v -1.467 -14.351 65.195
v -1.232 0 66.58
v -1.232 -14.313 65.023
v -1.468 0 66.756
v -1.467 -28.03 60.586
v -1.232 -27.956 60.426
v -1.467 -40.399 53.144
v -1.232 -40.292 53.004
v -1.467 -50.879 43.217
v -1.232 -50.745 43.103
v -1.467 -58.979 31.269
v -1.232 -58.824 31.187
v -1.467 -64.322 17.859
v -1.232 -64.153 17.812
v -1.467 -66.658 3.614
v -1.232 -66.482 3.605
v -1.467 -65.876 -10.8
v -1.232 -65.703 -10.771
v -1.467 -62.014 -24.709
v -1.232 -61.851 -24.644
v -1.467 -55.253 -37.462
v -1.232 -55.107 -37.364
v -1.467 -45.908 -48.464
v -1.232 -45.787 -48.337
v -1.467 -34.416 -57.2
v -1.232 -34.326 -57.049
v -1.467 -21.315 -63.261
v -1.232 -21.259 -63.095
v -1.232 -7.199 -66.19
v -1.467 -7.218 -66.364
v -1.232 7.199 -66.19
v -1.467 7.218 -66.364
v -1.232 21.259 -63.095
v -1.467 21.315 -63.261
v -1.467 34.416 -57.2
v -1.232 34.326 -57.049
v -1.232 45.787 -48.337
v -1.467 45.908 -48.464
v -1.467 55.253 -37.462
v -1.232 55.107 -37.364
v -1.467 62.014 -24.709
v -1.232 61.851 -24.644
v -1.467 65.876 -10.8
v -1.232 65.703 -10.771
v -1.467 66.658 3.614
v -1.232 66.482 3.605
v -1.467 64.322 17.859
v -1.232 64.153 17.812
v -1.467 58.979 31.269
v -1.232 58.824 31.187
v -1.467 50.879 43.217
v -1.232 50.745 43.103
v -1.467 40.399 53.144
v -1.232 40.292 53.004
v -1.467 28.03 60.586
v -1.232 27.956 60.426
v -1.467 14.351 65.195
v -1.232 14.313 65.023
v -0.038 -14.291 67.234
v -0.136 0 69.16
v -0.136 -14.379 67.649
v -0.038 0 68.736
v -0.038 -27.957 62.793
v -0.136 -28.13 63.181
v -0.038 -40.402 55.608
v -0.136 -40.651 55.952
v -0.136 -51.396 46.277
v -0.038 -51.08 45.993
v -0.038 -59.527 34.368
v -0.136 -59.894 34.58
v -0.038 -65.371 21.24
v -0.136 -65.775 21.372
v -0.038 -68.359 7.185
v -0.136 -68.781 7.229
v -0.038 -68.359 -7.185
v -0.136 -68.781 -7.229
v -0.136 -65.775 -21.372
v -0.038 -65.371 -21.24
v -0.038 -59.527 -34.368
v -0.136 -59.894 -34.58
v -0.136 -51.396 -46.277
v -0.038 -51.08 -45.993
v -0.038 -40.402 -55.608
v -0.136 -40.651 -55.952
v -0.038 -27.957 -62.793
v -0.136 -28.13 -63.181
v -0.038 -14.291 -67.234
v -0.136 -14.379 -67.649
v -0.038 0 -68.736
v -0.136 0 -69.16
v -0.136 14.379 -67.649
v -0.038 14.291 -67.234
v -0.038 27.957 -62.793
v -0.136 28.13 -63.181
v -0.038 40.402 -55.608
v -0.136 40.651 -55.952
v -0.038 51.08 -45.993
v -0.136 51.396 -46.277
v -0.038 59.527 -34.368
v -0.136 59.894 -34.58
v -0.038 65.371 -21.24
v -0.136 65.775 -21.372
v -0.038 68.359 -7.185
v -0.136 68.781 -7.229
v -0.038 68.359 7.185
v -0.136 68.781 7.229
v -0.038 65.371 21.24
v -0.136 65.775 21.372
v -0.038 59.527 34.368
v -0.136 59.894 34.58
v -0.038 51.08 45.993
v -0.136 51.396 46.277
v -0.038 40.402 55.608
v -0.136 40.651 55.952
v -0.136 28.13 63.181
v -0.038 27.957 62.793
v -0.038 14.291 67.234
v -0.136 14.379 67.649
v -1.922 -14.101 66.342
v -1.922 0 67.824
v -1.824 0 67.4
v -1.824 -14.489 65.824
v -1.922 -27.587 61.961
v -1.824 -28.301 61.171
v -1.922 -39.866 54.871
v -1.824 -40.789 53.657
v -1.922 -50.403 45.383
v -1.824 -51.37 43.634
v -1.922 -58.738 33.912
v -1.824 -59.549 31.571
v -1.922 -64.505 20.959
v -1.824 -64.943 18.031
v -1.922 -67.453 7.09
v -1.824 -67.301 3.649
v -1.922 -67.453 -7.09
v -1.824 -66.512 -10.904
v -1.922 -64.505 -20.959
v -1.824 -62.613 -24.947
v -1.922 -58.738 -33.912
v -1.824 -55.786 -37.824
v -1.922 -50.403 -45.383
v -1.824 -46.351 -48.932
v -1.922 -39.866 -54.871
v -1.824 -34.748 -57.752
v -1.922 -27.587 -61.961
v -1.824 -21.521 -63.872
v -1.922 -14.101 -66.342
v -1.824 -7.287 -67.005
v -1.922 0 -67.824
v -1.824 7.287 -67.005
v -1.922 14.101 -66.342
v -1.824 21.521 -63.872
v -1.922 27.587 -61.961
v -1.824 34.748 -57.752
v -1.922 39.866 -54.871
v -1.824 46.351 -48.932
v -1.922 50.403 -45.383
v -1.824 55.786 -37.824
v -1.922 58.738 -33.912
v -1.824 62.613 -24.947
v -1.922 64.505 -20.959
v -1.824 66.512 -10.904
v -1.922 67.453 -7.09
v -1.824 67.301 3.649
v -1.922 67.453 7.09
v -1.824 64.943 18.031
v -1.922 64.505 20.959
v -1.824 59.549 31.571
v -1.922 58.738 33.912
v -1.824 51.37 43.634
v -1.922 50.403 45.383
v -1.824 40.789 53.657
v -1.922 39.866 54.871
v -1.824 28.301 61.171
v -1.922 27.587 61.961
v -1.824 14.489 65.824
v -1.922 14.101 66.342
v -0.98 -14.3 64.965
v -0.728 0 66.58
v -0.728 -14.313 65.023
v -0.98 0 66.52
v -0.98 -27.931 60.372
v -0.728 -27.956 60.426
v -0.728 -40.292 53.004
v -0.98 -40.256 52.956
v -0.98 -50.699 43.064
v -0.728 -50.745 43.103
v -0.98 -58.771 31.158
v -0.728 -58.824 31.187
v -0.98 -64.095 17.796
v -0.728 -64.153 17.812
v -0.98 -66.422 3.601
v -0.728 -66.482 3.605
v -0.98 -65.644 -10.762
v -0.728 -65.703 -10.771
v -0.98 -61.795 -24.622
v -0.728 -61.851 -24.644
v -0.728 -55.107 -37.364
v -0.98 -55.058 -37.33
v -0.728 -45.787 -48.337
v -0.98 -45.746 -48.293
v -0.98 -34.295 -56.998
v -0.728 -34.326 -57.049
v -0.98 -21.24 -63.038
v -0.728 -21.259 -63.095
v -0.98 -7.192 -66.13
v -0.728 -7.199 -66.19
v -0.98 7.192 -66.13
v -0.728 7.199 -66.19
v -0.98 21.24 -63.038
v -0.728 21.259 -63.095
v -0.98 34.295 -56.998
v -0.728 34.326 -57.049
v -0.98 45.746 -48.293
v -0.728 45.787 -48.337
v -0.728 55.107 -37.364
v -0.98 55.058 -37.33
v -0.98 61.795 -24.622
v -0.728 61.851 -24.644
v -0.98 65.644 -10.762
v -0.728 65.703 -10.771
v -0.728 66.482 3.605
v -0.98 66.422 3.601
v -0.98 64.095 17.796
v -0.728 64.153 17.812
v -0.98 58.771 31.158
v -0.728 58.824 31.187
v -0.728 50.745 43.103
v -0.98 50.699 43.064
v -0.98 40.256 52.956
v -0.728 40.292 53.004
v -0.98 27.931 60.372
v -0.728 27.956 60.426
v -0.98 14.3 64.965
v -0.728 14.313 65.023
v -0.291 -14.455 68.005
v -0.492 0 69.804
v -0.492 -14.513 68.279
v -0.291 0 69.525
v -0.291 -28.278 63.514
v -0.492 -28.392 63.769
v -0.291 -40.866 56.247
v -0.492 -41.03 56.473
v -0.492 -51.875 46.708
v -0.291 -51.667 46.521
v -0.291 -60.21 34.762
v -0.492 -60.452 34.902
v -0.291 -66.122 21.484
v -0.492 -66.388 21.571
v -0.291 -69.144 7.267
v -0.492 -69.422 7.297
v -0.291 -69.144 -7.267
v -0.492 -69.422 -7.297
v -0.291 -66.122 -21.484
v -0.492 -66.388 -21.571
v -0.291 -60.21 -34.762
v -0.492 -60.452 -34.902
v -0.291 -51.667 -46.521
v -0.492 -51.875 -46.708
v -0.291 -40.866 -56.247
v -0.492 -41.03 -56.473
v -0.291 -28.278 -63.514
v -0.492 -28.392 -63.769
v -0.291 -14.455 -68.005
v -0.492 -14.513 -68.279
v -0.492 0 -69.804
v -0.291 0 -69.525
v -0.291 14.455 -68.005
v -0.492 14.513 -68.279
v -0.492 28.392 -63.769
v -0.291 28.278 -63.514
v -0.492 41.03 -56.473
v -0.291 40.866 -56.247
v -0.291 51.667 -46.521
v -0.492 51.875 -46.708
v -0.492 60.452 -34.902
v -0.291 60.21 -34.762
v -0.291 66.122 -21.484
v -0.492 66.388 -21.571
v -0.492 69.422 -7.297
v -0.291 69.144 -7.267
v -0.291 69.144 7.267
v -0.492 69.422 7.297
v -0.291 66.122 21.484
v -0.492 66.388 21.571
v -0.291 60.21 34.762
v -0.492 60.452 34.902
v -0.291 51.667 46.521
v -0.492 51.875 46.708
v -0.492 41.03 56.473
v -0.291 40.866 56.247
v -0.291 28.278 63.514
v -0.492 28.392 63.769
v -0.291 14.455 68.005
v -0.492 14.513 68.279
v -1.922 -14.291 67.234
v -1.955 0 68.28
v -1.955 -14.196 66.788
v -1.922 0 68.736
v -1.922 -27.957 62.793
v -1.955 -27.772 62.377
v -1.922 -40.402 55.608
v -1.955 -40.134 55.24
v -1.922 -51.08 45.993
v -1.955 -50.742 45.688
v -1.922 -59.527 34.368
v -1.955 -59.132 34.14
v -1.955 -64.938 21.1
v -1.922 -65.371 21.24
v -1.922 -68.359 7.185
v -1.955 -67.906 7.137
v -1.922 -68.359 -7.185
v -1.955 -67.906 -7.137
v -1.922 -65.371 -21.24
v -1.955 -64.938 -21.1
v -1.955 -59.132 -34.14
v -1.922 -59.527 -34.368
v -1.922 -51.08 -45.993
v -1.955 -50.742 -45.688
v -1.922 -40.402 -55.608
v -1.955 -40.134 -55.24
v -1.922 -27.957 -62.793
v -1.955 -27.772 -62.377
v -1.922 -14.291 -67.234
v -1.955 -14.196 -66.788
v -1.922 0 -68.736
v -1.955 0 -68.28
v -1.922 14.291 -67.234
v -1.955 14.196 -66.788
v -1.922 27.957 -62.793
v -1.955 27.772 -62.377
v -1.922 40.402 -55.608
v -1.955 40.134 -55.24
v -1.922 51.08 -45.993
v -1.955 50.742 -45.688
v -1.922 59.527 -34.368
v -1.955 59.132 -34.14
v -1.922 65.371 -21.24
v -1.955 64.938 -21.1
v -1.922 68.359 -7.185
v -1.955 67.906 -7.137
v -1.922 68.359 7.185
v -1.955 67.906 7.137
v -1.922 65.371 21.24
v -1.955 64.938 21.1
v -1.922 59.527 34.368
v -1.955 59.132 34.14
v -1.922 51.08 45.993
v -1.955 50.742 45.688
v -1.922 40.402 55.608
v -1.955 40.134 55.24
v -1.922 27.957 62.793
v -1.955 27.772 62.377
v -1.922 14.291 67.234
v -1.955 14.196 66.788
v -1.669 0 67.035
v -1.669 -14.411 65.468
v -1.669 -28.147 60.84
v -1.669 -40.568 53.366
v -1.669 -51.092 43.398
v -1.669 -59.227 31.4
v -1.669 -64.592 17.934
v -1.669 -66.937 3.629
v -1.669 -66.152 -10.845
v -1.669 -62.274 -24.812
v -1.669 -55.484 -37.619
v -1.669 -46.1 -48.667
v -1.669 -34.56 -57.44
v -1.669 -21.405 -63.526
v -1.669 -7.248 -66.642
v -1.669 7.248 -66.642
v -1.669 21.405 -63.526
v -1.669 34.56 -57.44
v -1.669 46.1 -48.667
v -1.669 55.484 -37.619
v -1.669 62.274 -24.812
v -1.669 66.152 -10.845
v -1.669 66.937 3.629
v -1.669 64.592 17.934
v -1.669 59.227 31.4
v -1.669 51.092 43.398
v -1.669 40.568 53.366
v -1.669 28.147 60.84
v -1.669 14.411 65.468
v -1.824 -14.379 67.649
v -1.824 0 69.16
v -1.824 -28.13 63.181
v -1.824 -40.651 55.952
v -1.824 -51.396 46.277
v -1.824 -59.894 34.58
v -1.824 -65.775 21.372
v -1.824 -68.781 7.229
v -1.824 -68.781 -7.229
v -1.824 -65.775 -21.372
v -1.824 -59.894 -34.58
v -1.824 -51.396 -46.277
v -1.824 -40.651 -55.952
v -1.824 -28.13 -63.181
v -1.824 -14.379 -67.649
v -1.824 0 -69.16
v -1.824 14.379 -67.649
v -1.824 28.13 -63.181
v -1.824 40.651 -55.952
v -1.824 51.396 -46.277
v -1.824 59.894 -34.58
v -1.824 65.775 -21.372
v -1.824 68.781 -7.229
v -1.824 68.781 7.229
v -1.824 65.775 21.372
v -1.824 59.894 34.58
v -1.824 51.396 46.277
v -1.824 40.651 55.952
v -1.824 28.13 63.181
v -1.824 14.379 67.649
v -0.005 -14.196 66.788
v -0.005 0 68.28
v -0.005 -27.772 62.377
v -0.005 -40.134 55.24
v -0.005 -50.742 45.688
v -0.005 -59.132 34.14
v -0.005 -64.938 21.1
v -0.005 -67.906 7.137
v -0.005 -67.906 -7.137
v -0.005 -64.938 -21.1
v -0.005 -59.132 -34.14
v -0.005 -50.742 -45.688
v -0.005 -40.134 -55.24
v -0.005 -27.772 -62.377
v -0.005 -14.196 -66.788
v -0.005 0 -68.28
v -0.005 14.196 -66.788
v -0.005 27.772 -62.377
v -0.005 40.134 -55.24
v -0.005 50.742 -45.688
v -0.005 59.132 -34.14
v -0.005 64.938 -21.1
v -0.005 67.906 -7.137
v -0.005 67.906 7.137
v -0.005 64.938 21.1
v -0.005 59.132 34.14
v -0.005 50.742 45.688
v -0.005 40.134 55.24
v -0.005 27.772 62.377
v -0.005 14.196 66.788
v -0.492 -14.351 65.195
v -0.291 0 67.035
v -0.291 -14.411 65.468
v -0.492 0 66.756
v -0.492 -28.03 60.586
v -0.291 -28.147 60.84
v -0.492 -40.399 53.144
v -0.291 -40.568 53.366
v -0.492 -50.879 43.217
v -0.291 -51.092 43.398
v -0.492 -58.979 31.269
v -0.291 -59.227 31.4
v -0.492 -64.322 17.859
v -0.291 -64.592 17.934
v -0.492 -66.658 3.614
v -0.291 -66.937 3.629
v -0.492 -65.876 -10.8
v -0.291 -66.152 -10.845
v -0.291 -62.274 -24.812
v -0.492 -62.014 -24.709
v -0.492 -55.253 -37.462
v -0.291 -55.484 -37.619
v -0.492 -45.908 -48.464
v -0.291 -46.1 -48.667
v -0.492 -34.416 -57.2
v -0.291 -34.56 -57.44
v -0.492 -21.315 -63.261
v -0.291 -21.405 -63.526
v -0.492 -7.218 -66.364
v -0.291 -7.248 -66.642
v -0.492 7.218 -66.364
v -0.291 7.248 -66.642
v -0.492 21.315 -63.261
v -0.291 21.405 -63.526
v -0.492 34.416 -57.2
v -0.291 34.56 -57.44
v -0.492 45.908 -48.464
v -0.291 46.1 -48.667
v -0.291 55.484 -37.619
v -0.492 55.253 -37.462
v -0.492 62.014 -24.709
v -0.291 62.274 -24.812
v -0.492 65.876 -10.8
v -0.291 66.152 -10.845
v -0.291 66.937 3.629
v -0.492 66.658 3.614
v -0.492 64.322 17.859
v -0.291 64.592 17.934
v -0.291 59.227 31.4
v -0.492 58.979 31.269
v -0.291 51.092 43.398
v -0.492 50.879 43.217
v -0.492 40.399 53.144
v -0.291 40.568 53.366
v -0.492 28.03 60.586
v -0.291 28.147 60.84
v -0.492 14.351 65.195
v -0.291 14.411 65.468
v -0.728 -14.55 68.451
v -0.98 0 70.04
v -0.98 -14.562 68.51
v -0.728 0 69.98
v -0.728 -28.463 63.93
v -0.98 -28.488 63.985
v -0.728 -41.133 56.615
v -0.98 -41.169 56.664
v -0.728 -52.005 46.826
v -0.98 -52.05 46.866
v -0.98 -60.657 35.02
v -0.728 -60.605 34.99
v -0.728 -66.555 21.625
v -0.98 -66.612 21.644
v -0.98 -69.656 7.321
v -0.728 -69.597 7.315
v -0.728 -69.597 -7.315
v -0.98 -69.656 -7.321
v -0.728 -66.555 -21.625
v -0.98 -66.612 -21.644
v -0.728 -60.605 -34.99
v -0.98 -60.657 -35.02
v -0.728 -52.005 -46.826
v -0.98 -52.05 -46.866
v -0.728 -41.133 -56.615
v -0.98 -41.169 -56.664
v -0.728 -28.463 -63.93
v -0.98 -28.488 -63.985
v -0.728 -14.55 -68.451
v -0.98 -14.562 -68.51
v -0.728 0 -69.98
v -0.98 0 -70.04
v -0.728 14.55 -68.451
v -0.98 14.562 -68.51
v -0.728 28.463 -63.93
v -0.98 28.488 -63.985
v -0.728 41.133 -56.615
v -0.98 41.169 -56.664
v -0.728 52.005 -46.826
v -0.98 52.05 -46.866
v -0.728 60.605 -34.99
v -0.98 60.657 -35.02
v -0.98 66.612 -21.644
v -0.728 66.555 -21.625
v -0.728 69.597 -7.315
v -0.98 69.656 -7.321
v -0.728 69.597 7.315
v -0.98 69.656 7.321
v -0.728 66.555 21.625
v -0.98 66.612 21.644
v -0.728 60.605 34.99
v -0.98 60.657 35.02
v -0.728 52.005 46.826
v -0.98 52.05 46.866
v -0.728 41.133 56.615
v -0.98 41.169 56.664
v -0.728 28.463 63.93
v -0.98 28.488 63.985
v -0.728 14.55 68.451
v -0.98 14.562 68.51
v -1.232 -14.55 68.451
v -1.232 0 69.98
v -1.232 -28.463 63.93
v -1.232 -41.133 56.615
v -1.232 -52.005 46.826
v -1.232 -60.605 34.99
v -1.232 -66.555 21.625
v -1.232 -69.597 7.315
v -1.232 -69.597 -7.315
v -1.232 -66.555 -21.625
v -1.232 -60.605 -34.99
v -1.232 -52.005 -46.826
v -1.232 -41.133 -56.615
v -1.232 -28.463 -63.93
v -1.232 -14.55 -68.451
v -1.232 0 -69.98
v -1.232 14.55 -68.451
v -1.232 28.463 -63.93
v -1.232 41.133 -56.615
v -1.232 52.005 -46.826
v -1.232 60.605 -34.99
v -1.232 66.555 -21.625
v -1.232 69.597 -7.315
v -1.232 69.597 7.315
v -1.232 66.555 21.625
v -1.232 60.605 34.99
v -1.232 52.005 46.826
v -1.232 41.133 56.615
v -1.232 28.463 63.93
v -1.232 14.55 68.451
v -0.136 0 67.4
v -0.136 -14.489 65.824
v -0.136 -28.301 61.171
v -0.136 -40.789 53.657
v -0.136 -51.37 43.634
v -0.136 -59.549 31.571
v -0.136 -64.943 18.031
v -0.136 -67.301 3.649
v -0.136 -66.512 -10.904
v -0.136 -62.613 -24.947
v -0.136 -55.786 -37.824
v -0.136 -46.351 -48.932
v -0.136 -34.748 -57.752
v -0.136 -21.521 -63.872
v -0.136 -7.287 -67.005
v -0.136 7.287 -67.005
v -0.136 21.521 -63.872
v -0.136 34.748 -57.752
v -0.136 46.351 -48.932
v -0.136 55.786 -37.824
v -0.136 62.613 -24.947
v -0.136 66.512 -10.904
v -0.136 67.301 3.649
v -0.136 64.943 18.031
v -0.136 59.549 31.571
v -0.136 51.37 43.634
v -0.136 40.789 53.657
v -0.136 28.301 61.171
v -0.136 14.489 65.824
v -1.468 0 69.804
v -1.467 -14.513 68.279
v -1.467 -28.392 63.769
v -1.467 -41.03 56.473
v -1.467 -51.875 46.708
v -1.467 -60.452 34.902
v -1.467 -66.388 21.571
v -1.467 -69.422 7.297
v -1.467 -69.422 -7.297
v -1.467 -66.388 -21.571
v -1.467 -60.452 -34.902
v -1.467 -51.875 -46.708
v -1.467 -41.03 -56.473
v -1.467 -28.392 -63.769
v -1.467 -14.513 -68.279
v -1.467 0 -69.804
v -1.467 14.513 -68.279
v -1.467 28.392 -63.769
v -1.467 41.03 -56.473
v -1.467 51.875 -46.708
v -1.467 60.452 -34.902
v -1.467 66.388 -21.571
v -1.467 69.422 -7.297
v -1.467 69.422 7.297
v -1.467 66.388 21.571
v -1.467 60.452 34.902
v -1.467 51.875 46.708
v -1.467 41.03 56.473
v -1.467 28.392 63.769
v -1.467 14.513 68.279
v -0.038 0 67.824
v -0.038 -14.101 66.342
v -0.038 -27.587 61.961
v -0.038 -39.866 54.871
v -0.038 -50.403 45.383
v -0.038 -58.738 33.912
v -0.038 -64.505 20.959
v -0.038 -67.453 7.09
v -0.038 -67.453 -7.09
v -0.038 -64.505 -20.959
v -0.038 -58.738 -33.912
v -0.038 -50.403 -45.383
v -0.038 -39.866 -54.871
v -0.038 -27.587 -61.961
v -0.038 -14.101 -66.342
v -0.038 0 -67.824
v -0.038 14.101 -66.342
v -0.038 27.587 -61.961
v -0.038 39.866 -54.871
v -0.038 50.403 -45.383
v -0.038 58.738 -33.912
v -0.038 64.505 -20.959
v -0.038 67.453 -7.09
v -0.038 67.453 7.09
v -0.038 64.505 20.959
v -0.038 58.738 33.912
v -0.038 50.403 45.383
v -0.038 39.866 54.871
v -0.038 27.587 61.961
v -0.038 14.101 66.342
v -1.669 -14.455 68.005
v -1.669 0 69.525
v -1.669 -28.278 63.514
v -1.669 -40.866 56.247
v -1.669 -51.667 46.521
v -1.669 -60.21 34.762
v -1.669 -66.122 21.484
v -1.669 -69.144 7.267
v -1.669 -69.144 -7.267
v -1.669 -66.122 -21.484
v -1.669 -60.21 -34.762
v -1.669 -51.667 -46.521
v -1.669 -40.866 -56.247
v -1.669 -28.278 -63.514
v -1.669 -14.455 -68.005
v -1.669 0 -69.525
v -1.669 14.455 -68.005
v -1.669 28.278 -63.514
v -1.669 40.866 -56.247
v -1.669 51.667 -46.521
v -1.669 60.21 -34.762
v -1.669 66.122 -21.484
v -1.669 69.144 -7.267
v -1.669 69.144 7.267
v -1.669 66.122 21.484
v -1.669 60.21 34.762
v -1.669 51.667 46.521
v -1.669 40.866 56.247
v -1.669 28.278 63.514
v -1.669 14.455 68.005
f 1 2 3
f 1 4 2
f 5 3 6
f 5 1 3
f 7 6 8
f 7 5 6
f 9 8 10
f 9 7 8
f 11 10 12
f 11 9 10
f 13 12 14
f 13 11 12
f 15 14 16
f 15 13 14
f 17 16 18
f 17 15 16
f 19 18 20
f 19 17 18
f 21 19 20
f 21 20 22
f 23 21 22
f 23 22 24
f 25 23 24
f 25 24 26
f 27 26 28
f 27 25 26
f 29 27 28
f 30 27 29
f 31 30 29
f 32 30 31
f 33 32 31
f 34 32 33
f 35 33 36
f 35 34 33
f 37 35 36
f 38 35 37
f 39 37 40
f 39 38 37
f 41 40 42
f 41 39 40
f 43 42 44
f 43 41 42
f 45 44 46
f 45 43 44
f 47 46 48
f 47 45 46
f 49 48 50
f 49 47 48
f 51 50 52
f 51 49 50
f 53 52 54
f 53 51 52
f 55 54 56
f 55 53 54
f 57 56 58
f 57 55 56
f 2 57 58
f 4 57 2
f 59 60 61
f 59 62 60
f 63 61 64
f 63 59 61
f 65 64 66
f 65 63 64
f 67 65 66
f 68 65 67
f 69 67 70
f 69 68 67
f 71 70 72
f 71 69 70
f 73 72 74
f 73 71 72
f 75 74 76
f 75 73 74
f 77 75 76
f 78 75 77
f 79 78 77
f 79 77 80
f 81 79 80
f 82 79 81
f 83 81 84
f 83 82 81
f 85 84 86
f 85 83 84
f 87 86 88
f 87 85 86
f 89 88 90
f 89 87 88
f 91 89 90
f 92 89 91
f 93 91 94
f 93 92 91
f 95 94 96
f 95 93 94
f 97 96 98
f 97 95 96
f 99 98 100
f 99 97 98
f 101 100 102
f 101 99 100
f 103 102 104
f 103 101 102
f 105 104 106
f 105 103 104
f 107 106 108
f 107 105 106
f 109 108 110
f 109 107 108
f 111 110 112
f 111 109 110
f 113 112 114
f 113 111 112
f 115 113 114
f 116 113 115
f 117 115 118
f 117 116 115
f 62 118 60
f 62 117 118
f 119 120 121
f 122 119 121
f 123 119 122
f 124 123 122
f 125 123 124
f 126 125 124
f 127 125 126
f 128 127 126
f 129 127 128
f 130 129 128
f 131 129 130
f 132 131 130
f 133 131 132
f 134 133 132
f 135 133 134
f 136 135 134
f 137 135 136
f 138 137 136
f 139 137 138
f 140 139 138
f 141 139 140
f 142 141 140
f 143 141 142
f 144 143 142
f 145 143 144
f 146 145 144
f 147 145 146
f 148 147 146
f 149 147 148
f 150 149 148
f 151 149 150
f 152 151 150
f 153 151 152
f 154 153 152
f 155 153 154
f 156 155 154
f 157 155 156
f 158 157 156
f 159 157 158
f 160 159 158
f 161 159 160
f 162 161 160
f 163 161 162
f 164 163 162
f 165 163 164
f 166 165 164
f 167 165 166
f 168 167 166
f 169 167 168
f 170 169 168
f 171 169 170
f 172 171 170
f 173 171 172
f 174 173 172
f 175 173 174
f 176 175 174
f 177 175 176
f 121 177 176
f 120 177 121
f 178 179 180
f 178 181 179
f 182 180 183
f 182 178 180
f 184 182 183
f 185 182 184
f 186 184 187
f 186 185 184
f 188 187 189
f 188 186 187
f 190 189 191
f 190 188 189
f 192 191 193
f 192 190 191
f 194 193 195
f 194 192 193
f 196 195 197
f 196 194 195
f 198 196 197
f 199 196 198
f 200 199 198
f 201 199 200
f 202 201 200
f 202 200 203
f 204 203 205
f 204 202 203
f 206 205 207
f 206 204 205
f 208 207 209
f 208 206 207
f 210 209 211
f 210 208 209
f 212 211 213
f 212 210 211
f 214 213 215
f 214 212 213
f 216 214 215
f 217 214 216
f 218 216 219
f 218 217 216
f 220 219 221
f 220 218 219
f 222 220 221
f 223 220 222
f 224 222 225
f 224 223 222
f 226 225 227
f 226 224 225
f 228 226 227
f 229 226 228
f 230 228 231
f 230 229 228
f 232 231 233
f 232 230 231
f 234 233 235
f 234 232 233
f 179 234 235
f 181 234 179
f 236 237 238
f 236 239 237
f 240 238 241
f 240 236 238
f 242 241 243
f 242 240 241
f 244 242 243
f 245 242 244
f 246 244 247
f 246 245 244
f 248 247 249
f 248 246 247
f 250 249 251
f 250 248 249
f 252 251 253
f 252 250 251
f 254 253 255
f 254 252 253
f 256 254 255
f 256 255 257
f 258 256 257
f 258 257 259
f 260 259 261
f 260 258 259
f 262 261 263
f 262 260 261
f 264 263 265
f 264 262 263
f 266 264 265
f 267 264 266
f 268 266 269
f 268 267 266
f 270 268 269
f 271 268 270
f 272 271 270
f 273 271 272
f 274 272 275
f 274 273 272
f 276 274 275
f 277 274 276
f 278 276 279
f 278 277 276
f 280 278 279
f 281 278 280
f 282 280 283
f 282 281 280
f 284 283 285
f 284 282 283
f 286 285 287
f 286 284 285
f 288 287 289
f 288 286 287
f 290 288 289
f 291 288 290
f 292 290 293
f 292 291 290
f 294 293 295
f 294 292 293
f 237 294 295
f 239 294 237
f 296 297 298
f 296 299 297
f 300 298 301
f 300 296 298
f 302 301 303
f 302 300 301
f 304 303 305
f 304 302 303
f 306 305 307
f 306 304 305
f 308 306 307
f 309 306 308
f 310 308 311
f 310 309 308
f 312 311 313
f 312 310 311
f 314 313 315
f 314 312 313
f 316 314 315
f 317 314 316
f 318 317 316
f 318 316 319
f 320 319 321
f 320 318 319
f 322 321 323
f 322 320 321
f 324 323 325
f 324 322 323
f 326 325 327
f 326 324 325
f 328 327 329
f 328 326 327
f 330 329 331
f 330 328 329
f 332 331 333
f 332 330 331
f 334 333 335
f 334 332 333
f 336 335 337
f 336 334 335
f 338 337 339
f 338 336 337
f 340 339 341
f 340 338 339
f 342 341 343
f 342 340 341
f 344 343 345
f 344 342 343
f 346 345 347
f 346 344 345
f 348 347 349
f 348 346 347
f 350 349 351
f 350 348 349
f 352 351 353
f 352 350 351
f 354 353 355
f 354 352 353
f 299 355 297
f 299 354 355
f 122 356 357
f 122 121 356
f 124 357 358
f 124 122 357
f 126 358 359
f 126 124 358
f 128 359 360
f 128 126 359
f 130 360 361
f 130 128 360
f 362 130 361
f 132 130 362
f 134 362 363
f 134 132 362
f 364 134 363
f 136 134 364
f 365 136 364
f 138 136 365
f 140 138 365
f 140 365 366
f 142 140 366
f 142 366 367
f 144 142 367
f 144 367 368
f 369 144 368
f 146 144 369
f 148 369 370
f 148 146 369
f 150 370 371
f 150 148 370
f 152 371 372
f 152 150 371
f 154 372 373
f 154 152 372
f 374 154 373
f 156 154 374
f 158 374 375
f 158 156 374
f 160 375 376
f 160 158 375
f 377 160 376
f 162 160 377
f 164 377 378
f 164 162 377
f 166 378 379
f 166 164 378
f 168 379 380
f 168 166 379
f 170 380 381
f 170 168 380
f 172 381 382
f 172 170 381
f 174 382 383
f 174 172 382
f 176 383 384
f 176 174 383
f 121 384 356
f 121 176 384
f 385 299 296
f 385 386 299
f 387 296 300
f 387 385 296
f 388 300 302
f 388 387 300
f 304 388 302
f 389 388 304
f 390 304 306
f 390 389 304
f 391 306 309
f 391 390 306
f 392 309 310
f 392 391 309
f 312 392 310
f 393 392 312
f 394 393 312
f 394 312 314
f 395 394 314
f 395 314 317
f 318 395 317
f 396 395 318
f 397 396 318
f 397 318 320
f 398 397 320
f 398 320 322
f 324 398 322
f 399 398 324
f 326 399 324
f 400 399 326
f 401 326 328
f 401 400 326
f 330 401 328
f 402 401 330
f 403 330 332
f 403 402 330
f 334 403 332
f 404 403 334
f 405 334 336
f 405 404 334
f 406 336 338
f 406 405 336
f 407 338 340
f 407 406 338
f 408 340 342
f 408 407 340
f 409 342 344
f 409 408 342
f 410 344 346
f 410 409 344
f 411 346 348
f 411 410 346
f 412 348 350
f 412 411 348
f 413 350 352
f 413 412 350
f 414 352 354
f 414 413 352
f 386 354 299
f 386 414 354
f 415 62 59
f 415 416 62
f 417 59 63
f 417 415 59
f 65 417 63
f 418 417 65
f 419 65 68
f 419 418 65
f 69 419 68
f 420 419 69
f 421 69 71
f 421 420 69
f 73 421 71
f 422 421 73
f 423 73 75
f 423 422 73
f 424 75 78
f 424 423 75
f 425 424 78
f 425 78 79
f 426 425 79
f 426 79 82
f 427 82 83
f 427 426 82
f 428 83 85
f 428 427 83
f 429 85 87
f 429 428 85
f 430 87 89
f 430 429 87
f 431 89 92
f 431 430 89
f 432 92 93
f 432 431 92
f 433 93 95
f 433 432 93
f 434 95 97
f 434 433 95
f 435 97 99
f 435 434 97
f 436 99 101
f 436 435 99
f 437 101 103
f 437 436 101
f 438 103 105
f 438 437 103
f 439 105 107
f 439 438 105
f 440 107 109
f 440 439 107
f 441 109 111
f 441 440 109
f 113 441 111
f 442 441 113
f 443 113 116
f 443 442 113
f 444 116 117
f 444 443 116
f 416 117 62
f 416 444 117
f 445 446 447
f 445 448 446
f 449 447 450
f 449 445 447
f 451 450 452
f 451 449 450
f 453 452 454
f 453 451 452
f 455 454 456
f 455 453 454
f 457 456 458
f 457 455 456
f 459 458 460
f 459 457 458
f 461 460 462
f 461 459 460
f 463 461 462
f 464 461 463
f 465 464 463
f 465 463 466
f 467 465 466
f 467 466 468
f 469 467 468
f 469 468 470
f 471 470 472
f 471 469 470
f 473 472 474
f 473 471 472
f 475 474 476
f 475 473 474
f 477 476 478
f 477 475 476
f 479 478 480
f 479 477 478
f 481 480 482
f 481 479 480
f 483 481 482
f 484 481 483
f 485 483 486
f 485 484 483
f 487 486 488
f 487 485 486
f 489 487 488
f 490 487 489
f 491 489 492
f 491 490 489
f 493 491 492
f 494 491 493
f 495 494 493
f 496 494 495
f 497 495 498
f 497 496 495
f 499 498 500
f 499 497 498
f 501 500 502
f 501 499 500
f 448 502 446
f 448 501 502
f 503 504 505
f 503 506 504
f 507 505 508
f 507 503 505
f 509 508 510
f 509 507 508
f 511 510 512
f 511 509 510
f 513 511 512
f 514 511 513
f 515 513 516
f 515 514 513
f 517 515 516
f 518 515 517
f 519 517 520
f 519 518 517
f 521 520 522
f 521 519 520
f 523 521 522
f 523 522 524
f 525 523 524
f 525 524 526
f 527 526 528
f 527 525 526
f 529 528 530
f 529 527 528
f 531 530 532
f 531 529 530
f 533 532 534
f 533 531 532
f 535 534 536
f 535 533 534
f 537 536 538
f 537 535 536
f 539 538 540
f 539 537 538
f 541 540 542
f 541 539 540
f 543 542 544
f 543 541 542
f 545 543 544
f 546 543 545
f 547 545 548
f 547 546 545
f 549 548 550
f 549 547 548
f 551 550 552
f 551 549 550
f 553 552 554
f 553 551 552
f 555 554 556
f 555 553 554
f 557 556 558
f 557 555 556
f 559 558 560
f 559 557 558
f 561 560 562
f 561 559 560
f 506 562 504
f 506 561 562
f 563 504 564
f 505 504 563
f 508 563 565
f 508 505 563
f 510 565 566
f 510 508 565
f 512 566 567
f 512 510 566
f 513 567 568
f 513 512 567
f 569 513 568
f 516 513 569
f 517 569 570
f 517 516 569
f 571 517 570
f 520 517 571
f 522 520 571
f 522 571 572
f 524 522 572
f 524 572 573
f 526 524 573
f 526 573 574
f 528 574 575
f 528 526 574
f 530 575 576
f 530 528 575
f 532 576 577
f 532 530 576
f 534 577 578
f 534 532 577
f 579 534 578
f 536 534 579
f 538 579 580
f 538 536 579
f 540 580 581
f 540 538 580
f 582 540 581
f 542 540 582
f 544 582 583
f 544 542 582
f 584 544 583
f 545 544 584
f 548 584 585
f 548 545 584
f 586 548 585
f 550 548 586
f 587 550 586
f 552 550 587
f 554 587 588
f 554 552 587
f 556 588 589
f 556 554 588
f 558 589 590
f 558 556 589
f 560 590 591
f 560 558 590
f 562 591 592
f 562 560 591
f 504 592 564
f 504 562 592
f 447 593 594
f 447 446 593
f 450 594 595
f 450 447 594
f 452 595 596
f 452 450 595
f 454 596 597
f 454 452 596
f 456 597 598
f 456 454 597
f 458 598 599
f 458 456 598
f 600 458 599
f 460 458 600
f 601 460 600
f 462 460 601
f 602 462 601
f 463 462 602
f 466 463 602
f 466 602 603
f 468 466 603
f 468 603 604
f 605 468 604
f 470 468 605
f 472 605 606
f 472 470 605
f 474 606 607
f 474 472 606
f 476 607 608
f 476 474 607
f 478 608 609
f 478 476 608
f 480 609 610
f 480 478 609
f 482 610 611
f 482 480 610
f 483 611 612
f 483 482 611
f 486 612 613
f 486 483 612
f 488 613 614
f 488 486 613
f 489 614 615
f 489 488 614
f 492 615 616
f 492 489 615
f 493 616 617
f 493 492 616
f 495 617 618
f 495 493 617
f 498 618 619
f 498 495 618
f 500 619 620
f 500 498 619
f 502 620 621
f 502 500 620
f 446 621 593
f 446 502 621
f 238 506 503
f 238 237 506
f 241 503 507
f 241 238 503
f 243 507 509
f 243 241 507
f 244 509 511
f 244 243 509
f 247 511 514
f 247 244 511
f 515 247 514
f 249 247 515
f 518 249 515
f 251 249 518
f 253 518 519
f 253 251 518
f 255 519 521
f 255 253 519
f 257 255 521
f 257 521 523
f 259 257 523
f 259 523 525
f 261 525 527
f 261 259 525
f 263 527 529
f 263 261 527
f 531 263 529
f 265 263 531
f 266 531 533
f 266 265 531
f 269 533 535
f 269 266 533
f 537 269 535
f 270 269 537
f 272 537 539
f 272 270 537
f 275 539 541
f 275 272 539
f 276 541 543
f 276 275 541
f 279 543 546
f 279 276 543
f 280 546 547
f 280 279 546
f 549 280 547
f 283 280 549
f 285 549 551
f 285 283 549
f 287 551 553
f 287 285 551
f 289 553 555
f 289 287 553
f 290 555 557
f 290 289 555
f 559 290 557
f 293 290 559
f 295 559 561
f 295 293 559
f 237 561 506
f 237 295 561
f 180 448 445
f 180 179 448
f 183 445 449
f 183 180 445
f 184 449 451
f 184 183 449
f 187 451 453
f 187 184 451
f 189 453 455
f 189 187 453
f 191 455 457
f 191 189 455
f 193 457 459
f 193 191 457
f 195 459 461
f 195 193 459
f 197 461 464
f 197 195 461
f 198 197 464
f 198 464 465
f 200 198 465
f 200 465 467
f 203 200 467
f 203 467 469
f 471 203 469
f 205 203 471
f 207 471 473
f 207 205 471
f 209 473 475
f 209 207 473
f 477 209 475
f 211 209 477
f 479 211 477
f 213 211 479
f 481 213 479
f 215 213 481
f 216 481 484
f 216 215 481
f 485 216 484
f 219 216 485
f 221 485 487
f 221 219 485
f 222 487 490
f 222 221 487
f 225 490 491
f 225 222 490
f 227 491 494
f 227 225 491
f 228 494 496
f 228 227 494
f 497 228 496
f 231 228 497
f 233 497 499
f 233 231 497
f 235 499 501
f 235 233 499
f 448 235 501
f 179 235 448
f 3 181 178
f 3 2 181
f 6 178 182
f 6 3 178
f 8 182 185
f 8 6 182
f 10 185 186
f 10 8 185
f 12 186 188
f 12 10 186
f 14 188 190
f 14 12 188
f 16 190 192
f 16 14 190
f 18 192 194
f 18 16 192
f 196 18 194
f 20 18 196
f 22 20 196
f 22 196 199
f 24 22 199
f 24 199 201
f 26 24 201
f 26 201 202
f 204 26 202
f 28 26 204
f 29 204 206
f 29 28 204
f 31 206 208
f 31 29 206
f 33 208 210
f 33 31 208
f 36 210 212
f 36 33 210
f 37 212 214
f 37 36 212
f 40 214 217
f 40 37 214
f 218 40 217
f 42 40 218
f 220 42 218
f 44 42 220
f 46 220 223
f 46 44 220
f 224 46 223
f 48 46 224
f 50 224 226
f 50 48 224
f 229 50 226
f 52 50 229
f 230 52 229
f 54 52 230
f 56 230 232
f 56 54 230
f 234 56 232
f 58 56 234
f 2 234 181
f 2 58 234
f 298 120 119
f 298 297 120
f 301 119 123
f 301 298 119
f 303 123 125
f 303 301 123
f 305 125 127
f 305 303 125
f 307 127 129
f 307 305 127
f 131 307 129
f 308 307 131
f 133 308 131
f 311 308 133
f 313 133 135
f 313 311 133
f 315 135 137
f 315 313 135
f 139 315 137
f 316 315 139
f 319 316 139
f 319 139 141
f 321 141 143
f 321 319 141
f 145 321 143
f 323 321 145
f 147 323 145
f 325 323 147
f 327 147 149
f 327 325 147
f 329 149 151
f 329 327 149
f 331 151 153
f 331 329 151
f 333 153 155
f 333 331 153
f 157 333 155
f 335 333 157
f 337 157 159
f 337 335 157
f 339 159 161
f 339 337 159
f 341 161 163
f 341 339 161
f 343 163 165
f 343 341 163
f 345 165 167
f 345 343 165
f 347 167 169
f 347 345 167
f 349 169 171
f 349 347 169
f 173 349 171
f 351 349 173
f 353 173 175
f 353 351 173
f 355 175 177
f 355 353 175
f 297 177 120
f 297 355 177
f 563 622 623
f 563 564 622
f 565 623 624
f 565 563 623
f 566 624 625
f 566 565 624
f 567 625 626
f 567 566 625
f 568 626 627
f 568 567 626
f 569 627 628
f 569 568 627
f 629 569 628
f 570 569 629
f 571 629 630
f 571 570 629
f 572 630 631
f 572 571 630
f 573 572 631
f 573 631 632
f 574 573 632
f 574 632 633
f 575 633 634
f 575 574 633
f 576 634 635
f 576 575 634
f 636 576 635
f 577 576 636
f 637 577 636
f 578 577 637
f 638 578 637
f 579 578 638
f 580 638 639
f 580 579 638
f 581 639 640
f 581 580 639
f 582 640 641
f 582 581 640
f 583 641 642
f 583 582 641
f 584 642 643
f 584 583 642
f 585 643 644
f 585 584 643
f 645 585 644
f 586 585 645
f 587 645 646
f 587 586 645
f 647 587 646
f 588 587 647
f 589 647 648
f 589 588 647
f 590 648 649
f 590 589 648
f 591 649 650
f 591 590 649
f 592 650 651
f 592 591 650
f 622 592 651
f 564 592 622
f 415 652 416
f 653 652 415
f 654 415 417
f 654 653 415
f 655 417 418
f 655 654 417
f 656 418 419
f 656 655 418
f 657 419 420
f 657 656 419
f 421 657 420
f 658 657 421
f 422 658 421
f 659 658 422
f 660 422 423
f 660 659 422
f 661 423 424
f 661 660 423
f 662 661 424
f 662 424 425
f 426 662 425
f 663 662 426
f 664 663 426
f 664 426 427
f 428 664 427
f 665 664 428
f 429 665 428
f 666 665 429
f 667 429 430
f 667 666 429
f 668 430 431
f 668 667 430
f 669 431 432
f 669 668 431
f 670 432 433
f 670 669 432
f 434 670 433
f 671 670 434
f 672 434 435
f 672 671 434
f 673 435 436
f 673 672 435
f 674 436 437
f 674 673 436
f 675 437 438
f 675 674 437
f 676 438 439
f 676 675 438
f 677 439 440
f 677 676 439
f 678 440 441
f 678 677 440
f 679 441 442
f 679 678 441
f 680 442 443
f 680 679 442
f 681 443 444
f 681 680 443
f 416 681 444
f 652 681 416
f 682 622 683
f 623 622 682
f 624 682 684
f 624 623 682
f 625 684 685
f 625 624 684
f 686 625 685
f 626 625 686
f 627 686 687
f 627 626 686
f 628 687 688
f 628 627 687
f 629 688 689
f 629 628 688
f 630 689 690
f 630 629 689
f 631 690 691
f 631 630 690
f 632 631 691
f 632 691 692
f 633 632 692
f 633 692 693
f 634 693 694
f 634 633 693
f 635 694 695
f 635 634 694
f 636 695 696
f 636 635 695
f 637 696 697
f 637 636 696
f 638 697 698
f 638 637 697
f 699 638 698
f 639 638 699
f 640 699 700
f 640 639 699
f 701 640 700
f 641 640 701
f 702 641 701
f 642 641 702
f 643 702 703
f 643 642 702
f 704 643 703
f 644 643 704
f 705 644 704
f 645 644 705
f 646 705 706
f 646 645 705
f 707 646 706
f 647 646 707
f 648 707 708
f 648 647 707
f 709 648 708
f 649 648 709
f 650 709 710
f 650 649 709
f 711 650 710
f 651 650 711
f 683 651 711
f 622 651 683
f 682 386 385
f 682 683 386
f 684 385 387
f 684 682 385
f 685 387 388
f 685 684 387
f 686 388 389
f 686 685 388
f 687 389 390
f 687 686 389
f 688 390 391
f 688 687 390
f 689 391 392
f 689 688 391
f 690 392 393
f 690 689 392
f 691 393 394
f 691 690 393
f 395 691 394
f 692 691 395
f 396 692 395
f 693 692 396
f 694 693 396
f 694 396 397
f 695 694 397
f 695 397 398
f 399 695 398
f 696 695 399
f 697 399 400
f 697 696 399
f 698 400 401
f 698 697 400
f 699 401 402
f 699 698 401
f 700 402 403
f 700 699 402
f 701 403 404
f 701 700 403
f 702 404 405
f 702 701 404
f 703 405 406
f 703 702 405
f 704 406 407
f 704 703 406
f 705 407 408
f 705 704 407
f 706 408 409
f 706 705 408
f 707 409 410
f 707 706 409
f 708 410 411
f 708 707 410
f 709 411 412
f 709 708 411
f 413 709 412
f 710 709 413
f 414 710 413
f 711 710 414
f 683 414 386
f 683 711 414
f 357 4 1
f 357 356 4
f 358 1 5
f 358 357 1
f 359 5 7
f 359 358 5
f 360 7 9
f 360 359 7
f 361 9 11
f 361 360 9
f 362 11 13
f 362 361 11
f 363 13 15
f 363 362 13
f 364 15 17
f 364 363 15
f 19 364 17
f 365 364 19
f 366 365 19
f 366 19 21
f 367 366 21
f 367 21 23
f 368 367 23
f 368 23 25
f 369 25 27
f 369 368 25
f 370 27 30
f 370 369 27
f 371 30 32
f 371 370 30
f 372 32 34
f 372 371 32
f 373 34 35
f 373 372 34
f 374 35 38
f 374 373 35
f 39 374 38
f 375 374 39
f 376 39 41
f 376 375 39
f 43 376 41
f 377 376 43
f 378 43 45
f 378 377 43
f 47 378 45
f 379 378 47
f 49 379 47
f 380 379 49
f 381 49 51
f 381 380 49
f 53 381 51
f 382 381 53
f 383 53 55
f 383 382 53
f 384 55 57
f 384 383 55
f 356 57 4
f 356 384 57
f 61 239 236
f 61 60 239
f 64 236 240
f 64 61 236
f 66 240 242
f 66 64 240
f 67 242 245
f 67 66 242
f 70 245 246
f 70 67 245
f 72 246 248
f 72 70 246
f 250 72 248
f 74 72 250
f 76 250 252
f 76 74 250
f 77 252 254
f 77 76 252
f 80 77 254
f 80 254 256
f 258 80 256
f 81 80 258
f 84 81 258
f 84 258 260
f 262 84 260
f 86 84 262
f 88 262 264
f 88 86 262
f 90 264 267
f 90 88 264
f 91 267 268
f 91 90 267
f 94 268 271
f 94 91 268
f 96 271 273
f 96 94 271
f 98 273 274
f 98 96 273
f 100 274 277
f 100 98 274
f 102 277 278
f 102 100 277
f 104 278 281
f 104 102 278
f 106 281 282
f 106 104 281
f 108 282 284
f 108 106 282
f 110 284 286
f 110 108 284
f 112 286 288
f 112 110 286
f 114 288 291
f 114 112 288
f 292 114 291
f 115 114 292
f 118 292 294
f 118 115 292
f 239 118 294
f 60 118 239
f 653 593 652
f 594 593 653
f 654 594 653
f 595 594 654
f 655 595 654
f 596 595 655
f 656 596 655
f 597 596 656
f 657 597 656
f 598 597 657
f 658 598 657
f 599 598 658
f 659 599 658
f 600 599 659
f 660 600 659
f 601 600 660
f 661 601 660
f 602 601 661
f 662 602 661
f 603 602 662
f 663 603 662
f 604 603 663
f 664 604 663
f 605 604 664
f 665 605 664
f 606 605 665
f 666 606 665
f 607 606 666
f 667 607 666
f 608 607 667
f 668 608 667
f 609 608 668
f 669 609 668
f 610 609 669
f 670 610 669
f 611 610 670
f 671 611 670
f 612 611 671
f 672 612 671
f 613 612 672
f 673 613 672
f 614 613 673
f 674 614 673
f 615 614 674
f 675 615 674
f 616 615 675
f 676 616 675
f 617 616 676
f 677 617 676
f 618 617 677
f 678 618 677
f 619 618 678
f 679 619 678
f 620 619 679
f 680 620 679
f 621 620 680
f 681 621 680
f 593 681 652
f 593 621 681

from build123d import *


with BuildPart() as part:
    # O_Ring_Outer Sketch → O_Ring_Outer (revolve)
    with BuildSketch(Plane.XY):
        Polygon((-1.955, 68.28), (-1.921777681, 68.735548065), (-1.824374769, 69.160051282), (-1.669429112, 69.524580459), (-1.4675, 69.804293534), (-1.232348569, 69.980128524), (-0.98, 70.040102564), (-0.727651431, 69.980128524), (-0.4925, 69.804293534), (-0.290570888, 69.524580459), (-0.135625231, 69.160051282), (-0.038222319, 68.735548065), (-0.005, 68.28), (-0.038222319, 67.824451935), (-0.135625231, 67.399948718), (-0.290570888, 67.035419541), (-0.4925, 66.755706466), (-0.727651431, 66.579871476), (-0.98, 66.519897436), (-1.232348569, 66.579871476), (-1.4675, 66.755706466), (-1.669429112, 67.035419541), (-1.824374769, 67.399948718), (-1.921777681, 67.824451935), align=None)
    revolve(axis=Axis((-1000, 0, 0), (1, 0, 0)))


solid = part.part
